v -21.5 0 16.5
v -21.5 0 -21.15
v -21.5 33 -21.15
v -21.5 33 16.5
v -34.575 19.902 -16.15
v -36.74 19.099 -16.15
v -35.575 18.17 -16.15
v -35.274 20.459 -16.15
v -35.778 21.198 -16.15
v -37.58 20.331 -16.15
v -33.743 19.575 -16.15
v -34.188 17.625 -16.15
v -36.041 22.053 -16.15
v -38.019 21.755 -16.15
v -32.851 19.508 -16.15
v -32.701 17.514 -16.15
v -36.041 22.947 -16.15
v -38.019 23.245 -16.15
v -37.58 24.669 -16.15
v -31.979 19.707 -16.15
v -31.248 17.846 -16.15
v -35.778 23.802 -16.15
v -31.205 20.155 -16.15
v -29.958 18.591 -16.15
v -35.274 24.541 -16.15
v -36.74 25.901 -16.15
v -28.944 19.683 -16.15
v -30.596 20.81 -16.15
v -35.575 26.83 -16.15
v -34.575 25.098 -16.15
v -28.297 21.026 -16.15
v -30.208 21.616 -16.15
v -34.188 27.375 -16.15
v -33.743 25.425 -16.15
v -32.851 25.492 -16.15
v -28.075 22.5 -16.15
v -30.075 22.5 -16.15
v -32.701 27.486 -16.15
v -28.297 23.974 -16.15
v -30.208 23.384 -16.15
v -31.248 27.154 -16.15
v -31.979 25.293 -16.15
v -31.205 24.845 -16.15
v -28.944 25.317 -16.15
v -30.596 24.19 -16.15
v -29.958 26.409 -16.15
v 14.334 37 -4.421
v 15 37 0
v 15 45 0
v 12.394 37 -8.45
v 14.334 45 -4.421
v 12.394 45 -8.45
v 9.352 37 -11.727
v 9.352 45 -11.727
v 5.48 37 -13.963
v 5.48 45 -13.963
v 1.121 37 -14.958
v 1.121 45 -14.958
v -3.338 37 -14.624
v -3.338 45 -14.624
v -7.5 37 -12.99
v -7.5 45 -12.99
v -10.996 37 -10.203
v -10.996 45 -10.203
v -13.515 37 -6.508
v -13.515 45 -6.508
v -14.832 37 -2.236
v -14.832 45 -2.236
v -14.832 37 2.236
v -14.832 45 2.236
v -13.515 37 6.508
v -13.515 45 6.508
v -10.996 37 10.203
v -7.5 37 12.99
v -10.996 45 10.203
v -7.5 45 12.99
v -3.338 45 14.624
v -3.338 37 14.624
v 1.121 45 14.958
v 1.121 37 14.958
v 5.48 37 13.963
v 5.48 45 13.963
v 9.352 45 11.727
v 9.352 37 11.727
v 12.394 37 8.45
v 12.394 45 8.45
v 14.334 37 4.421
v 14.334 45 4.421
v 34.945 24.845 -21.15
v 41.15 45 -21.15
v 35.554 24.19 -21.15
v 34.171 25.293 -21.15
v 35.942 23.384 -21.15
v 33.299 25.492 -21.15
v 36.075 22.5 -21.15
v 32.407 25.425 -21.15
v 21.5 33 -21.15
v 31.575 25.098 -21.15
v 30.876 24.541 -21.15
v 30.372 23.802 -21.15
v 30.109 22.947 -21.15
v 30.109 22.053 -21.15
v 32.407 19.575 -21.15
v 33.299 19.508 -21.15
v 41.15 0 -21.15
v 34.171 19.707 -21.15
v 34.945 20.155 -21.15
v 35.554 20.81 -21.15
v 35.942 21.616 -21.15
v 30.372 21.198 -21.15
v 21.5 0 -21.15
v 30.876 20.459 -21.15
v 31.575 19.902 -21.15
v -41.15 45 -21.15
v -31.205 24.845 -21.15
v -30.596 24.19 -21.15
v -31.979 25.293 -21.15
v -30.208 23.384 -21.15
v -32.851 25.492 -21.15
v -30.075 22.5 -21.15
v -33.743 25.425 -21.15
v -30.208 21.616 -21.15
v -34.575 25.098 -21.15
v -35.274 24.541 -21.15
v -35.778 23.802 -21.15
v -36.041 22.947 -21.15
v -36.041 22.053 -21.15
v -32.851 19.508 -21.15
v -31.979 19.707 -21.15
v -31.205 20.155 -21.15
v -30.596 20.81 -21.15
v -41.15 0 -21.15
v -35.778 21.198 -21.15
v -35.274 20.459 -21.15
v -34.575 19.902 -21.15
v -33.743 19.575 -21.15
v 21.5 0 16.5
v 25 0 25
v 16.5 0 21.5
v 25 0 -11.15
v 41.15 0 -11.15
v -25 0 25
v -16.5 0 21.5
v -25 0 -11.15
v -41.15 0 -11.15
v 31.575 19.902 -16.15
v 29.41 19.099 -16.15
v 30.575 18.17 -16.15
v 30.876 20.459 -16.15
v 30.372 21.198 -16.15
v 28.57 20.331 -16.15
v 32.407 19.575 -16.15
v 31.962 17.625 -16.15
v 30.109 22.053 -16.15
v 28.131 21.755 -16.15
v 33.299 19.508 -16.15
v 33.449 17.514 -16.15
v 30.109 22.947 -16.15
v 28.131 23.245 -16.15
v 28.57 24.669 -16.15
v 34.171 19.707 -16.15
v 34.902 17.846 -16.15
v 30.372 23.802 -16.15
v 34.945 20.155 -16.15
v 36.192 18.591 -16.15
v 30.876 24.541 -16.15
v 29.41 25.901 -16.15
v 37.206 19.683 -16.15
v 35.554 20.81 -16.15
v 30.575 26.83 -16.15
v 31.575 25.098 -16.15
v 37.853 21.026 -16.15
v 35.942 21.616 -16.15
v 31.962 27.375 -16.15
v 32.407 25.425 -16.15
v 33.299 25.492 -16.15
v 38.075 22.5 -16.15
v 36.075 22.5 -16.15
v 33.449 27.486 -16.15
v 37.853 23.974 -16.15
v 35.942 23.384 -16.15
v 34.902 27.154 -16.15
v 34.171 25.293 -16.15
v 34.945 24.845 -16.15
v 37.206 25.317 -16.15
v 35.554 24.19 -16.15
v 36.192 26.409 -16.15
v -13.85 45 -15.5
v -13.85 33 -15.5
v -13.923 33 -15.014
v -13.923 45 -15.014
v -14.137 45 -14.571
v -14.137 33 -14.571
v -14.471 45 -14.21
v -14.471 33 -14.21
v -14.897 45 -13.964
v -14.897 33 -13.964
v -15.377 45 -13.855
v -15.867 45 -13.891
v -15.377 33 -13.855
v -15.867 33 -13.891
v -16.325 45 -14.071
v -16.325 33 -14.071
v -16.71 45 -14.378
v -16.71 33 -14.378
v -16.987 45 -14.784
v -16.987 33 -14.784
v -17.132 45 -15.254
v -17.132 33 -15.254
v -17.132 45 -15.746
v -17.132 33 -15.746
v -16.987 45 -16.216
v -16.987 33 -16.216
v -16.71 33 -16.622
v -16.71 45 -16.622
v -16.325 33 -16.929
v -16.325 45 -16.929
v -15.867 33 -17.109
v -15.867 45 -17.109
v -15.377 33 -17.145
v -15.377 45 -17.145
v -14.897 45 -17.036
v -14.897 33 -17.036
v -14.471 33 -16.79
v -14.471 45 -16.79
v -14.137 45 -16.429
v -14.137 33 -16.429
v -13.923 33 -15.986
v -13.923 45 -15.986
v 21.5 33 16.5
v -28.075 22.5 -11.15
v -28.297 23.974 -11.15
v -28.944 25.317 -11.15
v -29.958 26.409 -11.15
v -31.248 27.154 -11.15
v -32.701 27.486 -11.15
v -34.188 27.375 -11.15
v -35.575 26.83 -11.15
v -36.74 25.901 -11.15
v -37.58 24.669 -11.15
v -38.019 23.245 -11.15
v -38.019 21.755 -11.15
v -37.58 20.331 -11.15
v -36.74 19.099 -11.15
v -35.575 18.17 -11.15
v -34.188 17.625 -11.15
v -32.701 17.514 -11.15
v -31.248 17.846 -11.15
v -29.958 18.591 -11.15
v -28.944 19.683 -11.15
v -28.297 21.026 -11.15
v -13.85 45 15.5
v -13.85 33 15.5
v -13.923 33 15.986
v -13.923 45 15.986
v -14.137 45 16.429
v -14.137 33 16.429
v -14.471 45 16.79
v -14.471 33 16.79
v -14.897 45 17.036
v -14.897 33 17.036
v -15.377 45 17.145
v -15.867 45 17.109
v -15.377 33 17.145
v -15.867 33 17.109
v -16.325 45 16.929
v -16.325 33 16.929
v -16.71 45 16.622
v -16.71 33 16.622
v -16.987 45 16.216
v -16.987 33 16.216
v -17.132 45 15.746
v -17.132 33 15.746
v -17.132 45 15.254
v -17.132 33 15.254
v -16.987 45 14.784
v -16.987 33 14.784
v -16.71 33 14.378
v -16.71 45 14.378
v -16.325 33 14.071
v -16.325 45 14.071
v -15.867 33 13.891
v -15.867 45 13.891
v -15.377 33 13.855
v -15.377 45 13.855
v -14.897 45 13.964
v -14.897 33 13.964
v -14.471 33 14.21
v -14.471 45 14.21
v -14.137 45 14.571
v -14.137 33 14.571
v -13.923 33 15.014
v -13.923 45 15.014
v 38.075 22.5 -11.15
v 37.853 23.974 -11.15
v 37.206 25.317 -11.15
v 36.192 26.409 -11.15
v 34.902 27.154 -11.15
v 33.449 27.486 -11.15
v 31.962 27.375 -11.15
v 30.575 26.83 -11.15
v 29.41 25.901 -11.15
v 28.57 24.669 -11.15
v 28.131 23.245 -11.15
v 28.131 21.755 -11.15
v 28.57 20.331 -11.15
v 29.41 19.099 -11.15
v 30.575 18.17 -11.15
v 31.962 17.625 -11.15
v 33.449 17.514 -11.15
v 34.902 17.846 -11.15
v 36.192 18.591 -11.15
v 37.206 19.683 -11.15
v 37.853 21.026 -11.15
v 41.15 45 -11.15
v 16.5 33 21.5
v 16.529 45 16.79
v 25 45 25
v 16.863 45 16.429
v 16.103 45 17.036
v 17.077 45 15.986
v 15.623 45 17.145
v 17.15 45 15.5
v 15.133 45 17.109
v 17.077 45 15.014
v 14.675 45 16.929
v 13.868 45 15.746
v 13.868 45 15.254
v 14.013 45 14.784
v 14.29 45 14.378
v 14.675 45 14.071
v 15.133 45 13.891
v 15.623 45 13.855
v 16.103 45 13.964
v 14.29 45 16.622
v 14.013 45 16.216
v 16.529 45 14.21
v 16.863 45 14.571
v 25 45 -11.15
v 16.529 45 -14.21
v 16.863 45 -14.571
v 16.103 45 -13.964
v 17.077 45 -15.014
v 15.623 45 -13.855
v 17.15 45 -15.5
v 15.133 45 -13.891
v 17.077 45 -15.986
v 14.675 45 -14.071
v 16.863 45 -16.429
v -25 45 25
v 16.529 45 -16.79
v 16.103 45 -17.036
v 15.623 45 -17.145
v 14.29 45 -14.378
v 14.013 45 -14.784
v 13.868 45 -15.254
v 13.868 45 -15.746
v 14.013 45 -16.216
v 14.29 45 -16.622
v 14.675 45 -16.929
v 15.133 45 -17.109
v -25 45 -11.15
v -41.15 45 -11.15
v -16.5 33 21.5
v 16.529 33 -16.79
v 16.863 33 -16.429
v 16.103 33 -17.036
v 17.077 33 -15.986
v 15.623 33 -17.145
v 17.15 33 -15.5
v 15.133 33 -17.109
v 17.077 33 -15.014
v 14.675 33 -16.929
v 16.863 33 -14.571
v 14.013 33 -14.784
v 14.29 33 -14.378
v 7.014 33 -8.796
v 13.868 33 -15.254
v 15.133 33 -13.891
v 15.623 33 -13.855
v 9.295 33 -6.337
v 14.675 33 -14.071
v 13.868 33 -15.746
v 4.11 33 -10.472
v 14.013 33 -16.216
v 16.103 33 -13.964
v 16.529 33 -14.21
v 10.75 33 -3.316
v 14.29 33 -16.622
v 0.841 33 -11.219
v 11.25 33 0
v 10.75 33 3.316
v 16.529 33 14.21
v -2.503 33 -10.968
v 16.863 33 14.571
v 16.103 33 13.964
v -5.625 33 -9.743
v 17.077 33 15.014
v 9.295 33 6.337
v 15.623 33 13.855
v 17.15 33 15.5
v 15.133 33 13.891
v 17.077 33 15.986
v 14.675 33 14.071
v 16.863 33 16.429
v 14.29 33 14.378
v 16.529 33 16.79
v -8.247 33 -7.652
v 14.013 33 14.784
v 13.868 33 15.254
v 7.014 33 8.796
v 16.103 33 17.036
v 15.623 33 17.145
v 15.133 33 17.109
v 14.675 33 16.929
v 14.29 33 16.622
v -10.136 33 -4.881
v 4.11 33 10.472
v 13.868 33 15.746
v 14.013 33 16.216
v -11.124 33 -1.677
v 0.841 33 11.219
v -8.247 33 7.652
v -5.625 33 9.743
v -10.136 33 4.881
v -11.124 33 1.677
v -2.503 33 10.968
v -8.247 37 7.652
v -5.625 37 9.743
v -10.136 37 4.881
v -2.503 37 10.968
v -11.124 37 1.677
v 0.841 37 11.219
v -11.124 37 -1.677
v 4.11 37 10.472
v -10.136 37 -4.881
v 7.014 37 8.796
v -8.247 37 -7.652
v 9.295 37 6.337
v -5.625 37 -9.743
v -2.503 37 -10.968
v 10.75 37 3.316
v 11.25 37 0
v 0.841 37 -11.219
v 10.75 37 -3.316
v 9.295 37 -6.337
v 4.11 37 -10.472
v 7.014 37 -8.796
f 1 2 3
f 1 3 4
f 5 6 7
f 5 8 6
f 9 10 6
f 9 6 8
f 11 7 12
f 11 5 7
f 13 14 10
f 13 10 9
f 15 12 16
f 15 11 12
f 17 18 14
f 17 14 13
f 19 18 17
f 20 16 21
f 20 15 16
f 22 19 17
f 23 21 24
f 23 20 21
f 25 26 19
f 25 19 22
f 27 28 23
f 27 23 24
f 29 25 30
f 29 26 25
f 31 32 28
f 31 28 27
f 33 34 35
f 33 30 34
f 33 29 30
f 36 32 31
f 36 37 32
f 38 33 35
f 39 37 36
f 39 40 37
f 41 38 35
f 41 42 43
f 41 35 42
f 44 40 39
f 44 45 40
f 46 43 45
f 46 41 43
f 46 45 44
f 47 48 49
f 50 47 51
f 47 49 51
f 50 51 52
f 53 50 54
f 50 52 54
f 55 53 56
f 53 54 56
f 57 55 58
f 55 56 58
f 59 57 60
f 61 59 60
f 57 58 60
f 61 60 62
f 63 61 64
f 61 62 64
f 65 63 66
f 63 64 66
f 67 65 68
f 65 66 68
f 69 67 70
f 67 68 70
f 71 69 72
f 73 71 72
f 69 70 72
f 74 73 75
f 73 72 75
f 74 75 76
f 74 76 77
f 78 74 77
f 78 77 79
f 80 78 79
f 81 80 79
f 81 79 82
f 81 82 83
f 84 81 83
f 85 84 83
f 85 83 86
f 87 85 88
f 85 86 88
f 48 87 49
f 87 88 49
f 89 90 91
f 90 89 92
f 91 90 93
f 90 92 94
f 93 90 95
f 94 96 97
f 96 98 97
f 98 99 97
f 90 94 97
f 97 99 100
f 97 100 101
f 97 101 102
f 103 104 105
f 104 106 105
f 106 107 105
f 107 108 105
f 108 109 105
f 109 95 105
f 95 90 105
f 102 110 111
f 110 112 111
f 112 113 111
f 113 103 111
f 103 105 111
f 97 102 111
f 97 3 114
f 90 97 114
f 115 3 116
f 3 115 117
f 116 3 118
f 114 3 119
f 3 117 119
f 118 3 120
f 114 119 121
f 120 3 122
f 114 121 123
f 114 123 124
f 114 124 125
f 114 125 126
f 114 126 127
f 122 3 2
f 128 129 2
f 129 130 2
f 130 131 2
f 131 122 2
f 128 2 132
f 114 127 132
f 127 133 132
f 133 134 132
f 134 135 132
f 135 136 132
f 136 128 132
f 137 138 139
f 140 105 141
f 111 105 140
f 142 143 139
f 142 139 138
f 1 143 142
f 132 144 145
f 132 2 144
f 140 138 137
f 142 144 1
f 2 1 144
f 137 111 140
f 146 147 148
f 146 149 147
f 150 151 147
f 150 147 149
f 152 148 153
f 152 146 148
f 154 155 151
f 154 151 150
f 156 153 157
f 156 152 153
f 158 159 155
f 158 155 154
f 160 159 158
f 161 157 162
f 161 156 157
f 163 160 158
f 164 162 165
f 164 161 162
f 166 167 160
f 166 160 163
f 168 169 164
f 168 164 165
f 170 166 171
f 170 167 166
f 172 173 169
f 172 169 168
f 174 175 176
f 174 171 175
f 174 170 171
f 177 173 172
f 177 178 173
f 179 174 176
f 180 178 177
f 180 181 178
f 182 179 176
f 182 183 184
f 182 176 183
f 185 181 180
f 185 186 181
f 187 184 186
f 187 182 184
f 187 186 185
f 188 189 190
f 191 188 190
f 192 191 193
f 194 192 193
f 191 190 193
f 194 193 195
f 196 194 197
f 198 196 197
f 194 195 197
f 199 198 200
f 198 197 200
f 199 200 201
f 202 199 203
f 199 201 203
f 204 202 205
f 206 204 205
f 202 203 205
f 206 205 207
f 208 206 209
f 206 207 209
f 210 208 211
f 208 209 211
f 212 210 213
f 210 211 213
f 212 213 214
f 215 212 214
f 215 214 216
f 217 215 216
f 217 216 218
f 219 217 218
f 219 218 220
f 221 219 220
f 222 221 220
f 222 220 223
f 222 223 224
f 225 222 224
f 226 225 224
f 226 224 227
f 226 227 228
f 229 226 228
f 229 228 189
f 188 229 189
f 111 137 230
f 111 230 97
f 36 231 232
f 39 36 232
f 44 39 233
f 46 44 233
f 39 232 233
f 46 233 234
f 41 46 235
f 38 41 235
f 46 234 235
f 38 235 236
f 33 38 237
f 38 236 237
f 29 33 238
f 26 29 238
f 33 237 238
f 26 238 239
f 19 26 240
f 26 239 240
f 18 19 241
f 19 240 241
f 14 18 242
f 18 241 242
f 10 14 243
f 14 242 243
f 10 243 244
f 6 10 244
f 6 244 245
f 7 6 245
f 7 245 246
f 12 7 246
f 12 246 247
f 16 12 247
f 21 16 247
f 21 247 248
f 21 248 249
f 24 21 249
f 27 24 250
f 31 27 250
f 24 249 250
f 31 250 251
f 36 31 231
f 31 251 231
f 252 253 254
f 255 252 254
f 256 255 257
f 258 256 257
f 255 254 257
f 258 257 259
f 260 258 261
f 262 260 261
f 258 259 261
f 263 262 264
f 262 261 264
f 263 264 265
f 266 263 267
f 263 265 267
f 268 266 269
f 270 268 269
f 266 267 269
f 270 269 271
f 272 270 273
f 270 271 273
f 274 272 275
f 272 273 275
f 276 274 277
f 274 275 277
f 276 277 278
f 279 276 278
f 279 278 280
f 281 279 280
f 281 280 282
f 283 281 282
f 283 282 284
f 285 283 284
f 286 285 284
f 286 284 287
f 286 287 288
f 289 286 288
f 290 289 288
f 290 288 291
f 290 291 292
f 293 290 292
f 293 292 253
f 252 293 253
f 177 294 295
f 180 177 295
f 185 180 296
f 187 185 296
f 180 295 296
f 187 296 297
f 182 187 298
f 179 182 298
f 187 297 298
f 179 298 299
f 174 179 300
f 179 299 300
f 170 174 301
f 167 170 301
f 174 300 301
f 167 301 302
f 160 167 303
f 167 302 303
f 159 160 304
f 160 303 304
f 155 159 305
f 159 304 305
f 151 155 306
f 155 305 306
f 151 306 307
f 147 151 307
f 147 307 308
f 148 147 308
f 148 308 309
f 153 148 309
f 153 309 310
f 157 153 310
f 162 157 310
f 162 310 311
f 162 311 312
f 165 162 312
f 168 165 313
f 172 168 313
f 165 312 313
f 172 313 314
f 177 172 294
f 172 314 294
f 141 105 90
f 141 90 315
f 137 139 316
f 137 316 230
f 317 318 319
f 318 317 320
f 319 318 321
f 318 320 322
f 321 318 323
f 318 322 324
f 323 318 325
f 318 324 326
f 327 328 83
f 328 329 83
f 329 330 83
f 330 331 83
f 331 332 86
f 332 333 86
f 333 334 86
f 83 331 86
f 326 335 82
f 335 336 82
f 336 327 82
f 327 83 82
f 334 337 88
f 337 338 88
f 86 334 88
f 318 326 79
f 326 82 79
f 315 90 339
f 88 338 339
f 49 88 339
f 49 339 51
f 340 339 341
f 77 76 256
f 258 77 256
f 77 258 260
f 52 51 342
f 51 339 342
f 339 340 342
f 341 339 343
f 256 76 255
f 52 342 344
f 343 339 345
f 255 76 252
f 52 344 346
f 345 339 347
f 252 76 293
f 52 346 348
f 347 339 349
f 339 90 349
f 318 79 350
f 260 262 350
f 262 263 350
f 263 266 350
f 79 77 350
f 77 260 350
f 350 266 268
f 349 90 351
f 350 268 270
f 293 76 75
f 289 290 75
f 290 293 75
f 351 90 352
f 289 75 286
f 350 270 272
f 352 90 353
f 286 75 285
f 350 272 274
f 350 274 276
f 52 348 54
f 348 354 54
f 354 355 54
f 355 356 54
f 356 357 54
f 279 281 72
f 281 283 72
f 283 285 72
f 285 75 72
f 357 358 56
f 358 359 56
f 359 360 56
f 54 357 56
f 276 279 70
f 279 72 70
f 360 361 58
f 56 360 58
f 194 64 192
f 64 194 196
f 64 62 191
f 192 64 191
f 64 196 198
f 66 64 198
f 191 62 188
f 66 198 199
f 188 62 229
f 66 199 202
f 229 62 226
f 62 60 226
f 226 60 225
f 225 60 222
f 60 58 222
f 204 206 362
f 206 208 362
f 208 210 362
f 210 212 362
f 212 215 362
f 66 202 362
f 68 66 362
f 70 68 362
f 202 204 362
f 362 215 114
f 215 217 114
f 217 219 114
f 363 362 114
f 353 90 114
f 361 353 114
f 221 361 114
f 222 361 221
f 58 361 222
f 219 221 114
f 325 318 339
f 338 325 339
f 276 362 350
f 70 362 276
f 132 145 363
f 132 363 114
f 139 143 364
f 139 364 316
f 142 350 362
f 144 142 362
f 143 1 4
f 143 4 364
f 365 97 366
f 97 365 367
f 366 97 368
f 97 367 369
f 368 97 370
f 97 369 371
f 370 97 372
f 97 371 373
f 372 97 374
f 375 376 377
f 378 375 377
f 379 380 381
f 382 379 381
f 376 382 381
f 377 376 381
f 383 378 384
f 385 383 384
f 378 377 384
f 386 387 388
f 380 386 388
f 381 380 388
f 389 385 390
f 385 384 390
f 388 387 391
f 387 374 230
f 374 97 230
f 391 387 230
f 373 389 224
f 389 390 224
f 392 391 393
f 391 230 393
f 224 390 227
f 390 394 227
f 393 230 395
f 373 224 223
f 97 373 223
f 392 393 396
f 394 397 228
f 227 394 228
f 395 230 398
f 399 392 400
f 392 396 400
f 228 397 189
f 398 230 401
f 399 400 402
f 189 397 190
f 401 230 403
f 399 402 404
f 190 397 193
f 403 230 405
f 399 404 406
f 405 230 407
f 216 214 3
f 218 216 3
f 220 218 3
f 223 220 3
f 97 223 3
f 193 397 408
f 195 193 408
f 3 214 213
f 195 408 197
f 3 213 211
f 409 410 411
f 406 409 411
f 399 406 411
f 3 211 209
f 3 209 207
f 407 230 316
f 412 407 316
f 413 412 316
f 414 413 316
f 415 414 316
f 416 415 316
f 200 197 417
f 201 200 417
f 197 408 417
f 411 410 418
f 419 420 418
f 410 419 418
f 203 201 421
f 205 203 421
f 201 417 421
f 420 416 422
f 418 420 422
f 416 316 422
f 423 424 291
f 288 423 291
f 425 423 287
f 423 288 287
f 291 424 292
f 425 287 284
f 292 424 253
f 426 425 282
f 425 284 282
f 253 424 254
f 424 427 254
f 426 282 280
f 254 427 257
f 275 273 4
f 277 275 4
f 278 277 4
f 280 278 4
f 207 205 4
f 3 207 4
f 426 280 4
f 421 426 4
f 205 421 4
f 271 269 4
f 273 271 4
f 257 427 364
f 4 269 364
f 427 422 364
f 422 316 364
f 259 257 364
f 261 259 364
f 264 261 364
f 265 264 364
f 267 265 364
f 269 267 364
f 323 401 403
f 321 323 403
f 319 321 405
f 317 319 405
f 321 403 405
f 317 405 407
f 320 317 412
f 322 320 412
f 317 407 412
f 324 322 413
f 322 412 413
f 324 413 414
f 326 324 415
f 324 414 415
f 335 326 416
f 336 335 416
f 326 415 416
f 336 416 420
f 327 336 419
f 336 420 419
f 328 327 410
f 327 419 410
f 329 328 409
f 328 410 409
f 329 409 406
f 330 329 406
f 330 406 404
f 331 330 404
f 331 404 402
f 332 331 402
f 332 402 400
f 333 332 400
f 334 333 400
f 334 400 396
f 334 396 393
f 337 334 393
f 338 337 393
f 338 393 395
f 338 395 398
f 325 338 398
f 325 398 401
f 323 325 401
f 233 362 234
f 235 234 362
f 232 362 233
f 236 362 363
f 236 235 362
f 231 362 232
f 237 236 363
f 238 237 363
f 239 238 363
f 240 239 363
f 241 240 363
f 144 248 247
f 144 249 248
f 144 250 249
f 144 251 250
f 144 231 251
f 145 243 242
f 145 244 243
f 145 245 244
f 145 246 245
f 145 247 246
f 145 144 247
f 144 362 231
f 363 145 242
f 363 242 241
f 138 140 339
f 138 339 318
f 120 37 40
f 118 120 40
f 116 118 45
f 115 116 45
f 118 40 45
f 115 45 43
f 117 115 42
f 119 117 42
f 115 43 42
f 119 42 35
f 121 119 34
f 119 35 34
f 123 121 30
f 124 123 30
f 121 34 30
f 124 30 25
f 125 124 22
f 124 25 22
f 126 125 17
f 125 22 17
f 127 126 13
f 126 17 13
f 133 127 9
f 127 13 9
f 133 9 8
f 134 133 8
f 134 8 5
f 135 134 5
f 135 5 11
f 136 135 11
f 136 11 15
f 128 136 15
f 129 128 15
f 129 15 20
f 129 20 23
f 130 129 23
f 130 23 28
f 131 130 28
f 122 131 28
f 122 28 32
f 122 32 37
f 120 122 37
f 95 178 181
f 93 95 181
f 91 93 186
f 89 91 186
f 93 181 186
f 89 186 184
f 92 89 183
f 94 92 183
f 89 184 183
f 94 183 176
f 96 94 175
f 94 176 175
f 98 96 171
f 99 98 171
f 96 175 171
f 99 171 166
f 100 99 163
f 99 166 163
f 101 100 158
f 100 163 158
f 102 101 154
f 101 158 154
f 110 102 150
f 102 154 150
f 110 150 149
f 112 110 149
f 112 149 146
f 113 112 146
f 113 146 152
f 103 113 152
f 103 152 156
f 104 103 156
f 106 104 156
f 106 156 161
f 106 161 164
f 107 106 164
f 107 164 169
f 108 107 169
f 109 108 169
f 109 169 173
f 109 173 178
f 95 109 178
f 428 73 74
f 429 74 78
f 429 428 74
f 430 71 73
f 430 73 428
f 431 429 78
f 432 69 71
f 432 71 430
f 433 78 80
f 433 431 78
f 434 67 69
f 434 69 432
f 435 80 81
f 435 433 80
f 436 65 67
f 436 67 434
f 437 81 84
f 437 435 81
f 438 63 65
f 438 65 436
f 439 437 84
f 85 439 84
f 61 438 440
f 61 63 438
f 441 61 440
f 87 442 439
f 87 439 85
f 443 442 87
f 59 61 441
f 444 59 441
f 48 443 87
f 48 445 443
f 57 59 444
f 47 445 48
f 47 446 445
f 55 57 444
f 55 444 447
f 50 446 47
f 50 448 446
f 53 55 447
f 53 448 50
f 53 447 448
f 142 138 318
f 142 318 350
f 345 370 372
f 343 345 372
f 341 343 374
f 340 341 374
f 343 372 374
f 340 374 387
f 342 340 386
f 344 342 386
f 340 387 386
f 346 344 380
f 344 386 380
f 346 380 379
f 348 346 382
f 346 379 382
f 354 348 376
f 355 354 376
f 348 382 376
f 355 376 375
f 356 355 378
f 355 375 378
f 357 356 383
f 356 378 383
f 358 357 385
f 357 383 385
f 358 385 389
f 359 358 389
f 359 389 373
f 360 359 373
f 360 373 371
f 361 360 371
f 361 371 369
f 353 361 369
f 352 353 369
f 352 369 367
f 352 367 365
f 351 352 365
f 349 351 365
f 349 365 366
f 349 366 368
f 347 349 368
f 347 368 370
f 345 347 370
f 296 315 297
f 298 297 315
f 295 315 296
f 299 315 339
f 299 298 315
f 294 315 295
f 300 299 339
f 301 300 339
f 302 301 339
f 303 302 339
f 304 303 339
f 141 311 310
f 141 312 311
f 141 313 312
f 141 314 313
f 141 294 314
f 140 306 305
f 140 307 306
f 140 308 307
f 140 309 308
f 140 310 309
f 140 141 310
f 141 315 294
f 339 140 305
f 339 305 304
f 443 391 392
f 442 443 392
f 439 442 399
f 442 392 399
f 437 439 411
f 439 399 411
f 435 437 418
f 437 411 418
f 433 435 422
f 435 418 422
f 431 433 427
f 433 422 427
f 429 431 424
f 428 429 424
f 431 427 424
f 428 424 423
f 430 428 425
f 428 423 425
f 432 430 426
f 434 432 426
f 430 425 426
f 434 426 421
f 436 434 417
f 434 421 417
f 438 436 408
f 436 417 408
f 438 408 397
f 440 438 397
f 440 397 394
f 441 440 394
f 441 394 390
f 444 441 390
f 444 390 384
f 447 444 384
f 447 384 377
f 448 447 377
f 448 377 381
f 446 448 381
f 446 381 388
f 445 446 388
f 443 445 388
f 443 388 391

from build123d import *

# Parameters (mm, degrees)
EXTRUDE_1_DEPTH     = 45
CUT_EXTRUDE_1_DEPTH = 33
SKETCH_3_R          = 11.25
CUT_EXTRUDE_2_DEPTH = 13
SKETCH_4_R          = 1.65
CUT_EXTRUDE_3_DEPTH = 13
SKETCH_5_R          = 3
CUT_EXTRUDE_4_DEPTH = 11
SKETCH_6_R          = 5
CUT_EXTRUDE_5_DEPTH = 5
SKETCH_7_R          = 15
CUT_EXTRUDE_6_DEPTH = 8


with BuildPart() as part:
    # Эскиз1 → Бобышка-Вытянуть1 (new body)
    with BuildSketch(Plane(origin=(0, 0, 0), x_dir=(1, 0, 0), z_dir=(0, 1, 0))):
        Polygon((-21.15, 21.15), (21.15, 21.15), (41.15, 21.15), (41.15, 11.15), (25, 11.15), (25, -25), (-25, -25), (-25, 11.15), (-41.15, 11.15), (-41.15, 21.15), align=None)
    extrude(amount=EXTRUDE_1_DEPTH)

    # Эскиз2 → Вырез-Вытянуть1 (cut)
    with BuildSketch(Plane.XZ):
        Polygon((-21.5, 16.5), (-16.5, 21.5), (16.5, 21.5), (21.5, 16.5), (21.5, -21.5), (-21.5, -21.5), align=None)
    extrude(amount=-CUT_EXTRUDE_1_DEPTH, mode=Mode.SUBTRACT)

    # Эскиз3 → Вырез-Вытянуть2 (cut, through all)
    with BuildSketch(Plane.XZ.offset(-33)):
        Circle(SKETCH_3_R)
    extrude(amount=-CUT_EXTRUDE_2_DEPTH, mode=Mode.SUBTRACT)

    # Эскиз4 → Вырез-Вытянуть3 (cut, through all)
    with BuildSketch(Plane.XZ.offset(-33)):
        with Locations((-15.5, 15.5)):
            Circle(SKETCH_4_R)
        with Locations((15.5, 15.5)):
            Circle(SKETCH_4_R)
        with Locations((-15.5, -15.5)):
            Circle(SKETCH_4_R)
        with Locations((15.5, -15.5)):
            Circle(SKETCH_4_R)
    extrude(amount=-CUT_EXTRUDE_3_DEPTH, mode=Mode.SUBTRACT)

    # Эскиз5 → Вырез-Вытянуть4 (cut, through all)
    with BuildSketch(Plane.XY.offset(-11.15)):
        with Locations((-33.075, 22.5)):
            Circle(SKETCH_5_R)
        with Locations((33.075, 22.5)):
            Circle(SKETCH_5_R)
    extrude(amount=-CUT_EXTRUDE_4_DEPTH, mode=Mode.SUBTRACT)

    # Эскиз6 → Вырез-Вытянуть5 (cut)
    with BuildSketch(Plane.XY.offset(-11.15)):
        with Locations((-33.075, 22.5)):
            Circle(SKETCH_6_R)
        with Locations((33.075, 22.5)):
            Circle(SKETCH_6_R)
    extrude(amount=-CUT_EXTRUDE_5_DEPTH, mode=Mode.SUBTRACT)

    # Эскиз7 → Вырез-Вытянуть6 (cut)
    with BuildSketch(Plane(origin=(0, 45, 0), x_dir=(1, 0, 0), z_dir=(0, 1, 0))):
        Circle(SKETCH_7_R)
    extrude(amount=-CUT_EXTRUDE_6_DEPTH, mode=Mode.SUBTRACT)


solid = part.part
